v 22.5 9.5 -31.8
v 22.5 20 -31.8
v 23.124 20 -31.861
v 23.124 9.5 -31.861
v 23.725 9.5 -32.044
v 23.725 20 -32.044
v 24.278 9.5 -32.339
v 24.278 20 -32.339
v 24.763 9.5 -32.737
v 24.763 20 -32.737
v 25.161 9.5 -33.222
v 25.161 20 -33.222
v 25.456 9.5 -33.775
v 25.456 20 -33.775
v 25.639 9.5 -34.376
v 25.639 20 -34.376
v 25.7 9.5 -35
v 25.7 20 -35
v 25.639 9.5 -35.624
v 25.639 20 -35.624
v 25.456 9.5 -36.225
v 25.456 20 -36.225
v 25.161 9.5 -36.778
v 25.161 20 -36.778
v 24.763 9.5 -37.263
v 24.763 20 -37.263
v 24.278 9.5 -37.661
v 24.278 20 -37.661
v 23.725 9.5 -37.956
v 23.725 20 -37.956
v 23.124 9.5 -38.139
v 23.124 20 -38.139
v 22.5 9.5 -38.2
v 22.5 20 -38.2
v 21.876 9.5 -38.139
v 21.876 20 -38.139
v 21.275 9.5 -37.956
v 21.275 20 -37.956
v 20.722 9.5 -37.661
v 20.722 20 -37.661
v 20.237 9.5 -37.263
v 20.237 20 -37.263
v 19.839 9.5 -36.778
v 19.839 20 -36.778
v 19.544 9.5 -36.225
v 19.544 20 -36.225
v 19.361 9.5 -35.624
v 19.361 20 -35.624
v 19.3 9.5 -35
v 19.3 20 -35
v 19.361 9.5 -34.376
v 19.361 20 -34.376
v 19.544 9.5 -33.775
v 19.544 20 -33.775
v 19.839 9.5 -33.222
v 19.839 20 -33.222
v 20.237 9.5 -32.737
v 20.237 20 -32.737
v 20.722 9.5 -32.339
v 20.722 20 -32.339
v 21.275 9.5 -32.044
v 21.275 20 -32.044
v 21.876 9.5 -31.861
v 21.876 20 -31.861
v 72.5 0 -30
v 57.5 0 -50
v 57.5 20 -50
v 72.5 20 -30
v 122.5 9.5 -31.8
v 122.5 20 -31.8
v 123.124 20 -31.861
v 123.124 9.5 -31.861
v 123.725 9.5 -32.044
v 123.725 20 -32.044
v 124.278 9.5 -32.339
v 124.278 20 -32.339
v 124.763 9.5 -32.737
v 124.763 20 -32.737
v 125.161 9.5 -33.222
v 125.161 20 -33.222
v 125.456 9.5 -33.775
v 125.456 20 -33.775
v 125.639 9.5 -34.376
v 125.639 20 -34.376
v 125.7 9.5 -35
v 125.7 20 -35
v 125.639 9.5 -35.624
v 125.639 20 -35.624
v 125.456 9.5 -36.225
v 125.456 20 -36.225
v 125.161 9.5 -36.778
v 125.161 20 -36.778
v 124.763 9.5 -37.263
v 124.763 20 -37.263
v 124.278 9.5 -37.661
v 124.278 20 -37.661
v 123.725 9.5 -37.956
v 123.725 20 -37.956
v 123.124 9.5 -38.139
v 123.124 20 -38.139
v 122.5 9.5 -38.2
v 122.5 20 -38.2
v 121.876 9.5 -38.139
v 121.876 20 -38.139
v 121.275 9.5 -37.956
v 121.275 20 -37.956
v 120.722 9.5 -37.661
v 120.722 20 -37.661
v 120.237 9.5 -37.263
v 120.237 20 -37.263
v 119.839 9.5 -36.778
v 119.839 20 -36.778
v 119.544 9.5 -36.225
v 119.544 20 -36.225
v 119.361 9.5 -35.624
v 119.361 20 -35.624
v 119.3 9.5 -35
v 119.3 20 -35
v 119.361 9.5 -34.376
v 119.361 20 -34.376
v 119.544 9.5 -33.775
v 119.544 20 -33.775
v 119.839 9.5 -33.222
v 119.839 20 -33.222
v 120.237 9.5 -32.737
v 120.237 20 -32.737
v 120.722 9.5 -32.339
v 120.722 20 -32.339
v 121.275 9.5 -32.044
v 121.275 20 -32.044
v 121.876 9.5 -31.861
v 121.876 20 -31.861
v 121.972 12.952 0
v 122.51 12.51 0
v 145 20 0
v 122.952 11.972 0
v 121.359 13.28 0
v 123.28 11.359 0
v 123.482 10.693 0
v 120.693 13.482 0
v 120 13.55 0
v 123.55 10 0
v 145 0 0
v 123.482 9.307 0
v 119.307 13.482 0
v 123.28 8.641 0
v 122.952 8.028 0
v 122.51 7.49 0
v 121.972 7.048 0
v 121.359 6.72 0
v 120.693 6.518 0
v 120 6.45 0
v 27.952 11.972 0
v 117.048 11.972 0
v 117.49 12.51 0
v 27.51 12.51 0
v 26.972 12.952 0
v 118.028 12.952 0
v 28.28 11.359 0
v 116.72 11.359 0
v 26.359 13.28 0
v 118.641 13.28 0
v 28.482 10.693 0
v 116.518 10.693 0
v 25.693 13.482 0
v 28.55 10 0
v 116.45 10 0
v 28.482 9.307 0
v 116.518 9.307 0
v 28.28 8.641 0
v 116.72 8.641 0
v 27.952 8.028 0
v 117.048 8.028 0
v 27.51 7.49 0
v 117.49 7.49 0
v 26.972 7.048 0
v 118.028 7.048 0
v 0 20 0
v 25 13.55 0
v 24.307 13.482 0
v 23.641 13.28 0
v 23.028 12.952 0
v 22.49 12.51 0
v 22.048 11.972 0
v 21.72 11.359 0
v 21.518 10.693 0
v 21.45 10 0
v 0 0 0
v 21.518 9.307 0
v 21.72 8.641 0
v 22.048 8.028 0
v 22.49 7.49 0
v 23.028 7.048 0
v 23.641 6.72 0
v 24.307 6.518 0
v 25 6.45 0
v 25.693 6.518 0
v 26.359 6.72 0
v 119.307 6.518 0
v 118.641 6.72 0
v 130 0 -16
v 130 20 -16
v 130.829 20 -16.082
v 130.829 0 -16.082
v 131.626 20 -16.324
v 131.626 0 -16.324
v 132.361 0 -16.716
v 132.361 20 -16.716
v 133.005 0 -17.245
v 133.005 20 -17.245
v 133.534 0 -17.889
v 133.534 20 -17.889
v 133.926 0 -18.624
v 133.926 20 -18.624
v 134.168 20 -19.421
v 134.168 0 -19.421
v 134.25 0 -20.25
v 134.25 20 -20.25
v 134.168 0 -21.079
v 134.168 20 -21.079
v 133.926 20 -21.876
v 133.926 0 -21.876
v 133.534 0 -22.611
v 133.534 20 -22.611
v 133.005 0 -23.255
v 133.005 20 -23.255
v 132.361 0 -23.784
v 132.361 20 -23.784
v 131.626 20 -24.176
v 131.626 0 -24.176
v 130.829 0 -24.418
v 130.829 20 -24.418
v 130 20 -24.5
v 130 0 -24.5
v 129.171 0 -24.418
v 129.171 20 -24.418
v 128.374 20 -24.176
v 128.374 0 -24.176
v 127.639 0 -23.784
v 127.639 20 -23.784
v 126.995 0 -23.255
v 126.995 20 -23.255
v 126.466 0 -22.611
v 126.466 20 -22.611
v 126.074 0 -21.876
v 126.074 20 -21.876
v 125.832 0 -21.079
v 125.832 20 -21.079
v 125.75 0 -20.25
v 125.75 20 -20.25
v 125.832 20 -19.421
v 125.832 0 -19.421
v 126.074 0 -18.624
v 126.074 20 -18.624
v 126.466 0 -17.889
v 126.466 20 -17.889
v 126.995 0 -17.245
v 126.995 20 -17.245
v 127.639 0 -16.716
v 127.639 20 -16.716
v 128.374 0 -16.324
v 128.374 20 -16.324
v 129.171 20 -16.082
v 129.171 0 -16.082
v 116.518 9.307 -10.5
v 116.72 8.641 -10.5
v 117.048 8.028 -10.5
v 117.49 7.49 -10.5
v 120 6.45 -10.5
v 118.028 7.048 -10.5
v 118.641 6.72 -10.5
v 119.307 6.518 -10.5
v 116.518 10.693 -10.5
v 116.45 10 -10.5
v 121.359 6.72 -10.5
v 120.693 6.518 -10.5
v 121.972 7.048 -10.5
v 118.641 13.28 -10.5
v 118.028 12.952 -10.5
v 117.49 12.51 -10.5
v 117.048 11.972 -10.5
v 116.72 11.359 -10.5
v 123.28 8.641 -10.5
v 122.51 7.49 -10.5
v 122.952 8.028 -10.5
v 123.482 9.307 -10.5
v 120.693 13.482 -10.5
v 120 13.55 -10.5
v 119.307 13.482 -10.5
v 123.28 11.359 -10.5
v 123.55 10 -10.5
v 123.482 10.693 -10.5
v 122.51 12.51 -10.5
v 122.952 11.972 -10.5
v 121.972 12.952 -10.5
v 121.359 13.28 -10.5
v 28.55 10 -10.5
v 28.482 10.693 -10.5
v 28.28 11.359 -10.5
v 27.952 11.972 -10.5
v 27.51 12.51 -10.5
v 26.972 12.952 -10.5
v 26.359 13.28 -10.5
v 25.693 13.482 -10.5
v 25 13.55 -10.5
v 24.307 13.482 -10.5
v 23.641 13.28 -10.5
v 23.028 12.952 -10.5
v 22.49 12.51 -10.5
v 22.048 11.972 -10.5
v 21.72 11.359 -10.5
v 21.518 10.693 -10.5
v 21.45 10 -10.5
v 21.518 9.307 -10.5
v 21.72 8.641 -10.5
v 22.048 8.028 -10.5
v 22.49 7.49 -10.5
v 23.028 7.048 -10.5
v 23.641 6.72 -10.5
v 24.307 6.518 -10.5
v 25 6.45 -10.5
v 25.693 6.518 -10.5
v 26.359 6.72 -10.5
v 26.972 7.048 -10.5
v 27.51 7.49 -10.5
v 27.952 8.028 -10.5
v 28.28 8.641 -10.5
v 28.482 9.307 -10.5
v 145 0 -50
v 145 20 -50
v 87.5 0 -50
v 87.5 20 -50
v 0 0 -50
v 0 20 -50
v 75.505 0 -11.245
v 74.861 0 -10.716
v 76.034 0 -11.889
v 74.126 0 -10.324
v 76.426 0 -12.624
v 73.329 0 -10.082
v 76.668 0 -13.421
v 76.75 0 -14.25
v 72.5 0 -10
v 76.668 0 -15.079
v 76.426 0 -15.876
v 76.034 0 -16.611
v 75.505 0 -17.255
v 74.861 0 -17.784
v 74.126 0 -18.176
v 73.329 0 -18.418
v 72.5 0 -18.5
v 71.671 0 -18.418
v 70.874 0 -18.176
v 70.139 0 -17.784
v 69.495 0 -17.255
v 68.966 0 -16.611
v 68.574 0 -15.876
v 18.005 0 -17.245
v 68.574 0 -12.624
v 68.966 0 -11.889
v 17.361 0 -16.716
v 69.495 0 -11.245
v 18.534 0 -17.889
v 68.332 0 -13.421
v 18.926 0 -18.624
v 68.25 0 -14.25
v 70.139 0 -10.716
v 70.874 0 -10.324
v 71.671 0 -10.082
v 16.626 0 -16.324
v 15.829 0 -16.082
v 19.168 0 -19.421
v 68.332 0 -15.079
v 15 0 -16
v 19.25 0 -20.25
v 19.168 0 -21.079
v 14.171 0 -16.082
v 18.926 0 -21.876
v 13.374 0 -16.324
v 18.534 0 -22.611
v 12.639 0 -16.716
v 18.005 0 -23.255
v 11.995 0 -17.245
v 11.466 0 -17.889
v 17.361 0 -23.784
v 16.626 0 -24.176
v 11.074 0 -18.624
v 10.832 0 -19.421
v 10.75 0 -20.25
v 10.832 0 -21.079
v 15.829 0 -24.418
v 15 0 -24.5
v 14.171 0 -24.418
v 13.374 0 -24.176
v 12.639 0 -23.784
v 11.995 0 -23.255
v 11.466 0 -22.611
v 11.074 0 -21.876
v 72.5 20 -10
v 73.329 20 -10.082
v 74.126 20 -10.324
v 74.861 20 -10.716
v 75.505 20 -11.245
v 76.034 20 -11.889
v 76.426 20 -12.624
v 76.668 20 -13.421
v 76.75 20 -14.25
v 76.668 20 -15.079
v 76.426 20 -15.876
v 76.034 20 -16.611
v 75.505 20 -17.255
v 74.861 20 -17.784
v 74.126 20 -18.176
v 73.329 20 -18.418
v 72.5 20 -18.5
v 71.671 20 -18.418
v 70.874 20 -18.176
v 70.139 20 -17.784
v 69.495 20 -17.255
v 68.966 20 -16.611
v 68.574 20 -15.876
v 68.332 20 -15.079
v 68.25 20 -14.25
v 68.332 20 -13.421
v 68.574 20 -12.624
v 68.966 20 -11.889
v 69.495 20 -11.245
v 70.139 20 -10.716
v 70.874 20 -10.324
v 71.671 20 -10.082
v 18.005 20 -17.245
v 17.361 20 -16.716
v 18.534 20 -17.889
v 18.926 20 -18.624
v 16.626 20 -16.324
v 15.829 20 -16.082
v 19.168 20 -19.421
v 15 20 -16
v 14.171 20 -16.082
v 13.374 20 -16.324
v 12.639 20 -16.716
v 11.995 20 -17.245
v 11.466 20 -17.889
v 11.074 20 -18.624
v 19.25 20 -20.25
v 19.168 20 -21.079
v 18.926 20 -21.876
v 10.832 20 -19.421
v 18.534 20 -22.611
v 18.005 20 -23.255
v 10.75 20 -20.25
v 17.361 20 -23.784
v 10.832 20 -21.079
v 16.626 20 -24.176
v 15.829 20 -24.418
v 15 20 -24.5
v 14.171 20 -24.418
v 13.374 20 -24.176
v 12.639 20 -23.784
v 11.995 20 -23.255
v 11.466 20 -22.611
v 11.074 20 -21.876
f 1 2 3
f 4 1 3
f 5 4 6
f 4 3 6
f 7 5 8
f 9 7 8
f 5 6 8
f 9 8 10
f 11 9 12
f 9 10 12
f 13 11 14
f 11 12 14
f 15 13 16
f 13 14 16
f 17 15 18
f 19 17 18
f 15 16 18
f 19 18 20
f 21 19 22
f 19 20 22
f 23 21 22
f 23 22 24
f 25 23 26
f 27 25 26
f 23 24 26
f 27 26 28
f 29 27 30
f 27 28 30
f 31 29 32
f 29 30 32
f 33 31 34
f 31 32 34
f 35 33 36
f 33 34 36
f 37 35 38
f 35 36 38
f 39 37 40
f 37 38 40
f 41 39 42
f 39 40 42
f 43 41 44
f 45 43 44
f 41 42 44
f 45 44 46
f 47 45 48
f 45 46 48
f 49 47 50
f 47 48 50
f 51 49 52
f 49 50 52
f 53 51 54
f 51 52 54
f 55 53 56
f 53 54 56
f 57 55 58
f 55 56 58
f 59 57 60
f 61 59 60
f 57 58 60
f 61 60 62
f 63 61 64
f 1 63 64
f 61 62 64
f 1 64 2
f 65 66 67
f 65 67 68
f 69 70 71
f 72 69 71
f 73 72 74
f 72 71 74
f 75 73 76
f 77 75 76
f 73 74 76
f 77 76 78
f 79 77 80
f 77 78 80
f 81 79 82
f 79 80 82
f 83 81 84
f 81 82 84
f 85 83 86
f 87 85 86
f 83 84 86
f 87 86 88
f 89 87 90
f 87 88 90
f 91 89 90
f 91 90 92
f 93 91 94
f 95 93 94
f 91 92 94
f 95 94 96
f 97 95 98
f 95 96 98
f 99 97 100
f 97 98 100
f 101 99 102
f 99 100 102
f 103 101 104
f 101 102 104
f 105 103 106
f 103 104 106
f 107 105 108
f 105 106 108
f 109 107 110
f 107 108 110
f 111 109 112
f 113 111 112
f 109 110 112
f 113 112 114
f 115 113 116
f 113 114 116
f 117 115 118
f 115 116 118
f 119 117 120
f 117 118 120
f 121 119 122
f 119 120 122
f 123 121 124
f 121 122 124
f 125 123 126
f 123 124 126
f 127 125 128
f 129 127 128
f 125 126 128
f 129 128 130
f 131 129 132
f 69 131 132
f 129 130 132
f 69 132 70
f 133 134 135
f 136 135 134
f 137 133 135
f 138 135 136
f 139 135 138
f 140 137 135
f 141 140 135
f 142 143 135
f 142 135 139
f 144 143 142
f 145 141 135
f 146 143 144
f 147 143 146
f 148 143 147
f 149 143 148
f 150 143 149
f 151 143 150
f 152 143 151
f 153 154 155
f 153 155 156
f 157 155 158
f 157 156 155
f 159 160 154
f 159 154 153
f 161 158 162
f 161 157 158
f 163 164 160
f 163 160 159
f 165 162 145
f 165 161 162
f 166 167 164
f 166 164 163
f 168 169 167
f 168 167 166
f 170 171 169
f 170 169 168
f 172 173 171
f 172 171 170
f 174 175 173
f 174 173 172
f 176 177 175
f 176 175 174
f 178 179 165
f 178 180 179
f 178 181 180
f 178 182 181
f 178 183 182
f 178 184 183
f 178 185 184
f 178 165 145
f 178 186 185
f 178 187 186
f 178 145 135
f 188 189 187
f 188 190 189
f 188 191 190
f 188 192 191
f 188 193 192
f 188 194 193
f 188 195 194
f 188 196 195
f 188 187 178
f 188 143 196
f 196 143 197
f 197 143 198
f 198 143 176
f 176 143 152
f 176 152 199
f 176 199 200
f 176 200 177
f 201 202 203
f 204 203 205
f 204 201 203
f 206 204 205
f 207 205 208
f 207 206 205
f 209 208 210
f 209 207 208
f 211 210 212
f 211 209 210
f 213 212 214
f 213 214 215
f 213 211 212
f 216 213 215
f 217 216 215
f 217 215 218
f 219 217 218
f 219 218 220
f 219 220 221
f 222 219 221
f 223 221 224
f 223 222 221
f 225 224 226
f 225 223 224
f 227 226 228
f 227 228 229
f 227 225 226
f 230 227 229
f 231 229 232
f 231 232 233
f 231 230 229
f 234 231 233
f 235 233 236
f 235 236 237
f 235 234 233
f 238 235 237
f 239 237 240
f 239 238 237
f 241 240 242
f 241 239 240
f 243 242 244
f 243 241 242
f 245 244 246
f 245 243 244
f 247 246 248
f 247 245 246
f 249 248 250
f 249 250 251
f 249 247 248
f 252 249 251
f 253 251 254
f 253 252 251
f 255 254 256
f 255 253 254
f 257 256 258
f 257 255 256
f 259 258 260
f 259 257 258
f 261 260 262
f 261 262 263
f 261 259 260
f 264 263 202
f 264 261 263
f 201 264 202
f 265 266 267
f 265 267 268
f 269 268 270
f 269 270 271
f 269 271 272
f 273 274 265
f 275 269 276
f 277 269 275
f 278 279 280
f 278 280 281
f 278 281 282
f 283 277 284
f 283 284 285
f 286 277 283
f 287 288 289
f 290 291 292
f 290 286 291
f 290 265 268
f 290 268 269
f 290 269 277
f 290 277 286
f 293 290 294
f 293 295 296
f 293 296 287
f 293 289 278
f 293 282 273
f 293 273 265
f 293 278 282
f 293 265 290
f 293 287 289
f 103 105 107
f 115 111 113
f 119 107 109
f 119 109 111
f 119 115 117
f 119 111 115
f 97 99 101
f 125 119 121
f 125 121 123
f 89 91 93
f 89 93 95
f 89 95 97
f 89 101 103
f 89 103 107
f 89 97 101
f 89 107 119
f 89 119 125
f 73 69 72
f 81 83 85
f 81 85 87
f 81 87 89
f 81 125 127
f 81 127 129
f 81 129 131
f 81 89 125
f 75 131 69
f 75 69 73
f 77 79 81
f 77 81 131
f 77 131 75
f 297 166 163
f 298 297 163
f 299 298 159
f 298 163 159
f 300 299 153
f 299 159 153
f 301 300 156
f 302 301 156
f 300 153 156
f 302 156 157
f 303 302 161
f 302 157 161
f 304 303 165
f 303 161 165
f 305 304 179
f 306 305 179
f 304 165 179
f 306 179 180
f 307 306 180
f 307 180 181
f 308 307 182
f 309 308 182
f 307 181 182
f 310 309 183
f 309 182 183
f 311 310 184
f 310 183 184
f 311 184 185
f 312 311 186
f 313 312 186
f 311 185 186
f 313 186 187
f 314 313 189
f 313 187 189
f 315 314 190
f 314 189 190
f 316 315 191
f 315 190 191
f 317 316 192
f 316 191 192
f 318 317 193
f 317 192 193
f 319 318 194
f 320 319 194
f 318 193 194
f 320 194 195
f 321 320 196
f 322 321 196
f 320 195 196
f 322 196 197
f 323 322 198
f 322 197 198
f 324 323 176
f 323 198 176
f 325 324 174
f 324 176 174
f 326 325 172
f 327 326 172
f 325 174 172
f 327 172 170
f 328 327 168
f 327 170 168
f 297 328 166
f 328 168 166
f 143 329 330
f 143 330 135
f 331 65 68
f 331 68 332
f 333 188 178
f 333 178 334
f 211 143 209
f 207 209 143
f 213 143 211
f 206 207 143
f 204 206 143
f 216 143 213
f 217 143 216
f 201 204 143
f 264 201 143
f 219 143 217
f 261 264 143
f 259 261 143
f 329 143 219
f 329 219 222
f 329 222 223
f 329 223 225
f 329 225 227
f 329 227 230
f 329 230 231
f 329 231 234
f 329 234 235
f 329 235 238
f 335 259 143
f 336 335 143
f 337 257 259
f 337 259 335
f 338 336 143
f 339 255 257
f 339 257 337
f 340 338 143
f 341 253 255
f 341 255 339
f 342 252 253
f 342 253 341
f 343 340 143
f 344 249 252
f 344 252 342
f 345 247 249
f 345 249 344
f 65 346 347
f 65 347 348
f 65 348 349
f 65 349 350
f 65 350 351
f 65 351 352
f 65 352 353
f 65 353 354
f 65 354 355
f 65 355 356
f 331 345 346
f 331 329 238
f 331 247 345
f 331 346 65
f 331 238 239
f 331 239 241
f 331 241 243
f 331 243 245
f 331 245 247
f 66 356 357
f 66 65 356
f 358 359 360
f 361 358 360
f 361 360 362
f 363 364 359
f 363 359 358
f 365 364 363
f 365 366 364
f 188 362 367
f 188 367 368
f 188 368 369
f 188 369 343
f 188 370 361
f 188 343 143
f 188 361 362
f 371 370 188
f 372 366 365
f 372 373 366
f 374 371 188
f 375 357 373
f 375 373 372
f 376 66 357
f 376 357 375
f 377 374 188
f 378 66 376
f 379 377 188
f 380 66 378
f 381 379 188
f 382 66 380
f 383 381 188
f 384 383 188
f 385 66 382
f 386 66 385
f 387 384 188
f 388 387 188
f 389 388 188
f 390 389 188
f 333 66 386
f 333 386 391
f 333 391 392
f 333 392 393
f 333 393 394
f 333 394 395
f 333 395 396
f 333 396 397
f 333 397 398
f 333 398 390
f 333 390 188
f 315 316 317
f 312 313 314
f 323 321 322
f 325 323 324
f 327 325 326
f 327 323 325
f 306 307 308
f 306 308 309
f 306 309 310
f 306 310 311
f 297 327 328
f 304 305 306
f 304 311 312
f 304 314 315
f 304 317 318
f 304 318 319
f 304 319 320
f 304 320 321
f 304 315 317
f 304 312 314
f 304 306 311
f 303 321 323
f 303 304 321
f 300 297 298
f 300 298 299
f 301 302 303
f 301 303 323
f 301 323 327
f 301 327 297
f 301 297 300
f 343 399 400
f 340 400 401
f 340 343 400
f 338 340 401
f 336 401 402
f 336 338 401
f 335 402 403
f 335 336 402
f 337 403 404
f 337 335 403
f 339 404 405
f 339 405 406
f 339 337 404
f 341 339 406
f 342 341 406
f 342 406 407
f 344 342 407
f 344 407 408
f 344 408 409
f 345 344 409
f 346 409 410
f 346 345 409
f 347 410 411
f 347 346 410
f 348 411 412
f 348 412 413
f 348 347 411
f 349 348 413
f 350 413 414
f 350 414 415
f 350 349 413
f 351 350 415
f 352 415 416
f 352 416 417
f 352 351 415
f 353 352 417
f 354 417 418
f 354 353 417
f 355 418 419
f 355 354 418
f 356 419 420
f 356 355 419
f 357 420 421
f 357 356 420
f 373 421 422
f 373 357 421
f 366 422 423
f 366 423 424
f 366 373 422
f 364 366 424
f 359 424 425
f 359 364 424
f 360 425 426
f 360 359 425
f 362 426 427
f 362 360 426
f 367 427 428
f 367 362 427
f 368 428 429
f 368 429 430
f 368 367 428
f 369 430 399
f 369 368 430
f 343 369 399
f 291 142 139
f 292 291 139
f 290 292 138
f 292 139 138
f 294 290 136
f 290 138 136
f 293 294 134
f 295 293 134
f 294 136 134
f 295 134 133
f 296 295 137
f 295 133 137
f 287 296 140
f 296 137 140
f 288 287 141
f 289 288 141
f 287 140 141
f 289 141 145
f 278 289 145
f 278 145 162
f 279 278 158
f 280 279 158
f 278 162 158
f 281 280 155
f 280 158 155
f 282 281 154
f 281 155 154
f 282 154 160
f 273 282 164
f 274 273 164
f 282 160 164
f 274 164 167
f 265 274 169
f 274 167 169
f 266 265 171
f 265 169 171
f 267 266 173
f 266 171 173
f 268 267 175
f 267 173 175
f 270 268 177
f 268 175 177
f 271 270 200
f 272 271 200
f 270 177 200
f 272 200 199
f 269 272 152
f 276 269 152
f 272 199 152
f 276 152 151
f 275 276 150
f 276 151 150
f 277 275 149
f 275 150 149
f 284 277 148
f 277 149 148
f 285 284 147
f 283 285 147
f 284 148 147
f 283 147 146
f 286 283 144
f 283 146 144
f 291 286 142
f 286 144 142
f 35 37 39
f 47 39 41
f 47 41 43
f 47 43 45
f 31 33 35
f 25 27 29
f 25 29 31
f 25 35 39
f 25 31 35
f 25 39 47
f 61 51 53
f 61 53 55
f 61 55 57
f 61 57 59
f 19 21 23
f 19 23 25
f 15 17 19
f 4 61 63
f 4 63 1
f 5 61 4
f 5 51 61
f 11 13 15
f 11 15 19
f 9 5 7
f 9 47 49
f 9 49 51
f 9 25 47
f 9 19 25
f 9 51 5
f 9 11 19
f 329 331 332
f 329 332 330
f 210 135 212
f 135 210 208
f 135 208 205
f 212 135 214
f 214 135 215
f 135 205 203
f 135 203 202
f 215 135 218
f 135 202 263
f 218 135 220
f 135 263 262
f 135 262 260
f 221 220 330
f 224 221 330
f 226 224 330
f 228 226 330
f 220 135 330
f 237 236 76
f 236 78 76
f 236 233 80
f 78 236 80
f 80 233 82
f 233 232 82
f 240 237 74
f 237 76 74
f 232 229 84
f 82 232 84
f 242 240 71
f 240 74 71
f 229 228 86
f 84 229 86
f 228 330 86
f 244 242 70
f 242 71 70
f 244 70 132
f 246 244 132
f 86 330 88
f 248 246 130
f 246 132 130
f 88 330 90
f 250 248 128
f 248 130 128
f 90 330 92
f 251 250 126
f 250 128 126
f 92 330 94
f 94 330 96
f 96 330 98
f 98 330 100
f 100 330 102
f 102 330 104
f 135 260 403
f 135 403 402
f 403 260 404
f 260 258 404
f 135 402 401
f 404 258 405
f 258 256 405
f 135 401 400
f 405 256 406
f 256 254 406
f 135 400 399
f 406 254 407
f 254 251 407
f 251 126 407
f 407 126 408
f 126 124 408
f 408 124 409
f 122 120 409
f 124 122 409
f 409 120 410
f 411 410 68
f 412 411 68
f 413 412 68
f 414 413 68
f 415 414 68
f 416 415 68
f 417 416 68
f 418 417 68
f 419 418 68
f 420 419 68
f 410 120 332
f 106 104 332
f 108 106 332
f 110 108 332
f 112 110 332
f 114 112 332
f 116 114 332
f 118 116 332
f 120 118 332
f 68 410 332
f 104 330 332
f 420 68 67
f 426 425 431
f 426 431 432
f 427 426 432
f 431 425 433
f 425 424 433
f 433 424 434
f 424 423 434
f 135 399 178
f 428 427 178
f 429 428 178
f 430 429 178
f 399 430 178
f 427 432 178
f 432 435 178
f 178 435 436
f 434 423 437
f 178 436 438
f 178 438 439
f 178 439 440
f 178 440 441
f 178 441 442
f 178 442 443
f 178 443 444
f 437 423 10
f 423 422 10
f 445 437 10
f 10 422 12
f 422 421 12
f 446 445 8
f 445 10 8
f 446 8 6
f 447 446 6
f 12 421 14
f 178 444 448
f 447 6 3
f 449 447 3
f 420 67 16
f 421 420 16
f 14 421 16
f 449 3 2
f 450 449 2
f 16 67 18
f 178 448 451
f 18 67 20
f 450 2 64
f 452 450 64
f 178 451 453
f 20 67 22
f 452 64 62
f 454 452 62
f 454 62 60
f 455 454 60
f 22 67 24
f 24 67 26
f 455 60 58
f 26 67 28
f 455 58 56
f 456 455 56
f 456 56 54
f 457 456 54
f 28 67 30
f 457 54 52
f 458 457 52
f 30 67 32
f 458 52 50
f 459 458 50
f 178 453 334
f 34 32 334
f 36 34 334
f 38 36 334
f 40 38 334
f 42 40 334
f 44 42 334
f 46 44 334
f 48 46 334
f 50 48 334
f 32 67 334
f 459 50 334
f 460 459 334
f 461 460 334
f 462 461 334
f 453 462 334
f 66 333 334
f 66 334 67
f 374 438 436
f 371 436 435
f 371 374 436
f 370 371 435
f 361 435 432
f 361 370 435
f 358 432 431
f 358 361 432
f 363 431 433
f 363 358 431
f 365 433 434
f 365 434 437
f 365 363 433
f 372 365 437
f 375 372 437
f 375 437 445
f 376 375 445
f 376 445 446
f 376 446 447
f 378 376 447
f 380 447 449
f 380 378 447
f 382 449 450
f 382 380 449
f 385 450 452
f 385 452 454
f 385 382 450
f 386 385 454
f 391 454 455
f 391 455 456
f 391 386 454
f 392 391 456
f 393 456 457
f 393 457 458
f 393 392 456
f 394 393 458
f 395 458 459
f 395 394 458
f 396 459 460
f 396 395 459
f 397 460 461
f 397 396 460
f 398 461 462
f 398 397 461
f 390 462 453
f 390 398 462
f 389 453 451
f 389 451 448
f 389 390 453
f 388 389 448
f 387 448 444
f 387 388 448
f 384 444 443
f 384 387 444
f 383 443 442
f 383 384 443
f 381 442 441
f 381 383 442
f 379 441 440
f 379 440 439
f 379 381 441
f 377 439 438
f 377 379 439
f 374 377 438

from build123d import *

# Parameters (mm, degrees)
SKETCH1_R           = 4.25
BOSS_EXTRUDE1_DEPTH = 20
SKETCH3_R           = 3.55
CUT_EXTRUDE2_DEPTH  = 10.5
SKETCH2_R           = 3.2
CUT_EXTRUDE3_DEPTH  = 10.5


with BuildPart() as part:
    # Sketch1 → Boss-Extrude1 (new body)
    with BuildSketch(Plane(origin=(0, 0, 0), x_dir=(1, 0, 0), z_dir=(0, 1, 0))):
        Polygon((0, 0), (0, 50), (57.5, 50), (72.5, 30), (87.5, 50), (145, 50), (145, 0), align=None)
        with Locations(Location((15, 20.25, 0), (0, 0, 270))):
            Circle(SKETCH1_R, mode=Mode.SUBTRACT)
        with Locations(Location((72.5, 14.25, 0), (0, 0, 270))):
            Circle(SKETCH1_R, mode=Mode.SUBTRACT)
        with Locations(Location((130, 20.25, 0), (0, 0, 270))):
            Circle(SKETCH1_R, mode=Mode.SUBTRACT)
    extrude(amount=BOSS_EXTRUDE1_DEPTH)

    # Sketch3 → Cut-Extrude2 (cut)
    with BuildSketch(Plane.XY):
        with Locations((25, 10)):
            Circle(SKETCH3_R)
        with Locations((120, 10)):
            Circle(SKETCH3_R)
    extrude(amount=-CUT_EXTRUDE2_DEPTH, mode=Mode.SUBTRACT)

    # Sketch2 → Cut-Extrude3 (cut)
    with BuildSketch(Plane(origin=(0, 20, 0), x_dir=(1, 0, 0), z_dir=(0, 1, 0))):
        with Locations(Location((22.5, 35, 0), (0, 0, 270))):
            Circle(SKETCH2_R)
        with Locations(Location((122.5, 35, 0), (0, 0, 270))):
            Circle(SKETCH2_R)
    extrude(amount=-CUT_EXTRUDE3_DEPTH, mode=Mode.SUBTRACT)


solid = part.part
